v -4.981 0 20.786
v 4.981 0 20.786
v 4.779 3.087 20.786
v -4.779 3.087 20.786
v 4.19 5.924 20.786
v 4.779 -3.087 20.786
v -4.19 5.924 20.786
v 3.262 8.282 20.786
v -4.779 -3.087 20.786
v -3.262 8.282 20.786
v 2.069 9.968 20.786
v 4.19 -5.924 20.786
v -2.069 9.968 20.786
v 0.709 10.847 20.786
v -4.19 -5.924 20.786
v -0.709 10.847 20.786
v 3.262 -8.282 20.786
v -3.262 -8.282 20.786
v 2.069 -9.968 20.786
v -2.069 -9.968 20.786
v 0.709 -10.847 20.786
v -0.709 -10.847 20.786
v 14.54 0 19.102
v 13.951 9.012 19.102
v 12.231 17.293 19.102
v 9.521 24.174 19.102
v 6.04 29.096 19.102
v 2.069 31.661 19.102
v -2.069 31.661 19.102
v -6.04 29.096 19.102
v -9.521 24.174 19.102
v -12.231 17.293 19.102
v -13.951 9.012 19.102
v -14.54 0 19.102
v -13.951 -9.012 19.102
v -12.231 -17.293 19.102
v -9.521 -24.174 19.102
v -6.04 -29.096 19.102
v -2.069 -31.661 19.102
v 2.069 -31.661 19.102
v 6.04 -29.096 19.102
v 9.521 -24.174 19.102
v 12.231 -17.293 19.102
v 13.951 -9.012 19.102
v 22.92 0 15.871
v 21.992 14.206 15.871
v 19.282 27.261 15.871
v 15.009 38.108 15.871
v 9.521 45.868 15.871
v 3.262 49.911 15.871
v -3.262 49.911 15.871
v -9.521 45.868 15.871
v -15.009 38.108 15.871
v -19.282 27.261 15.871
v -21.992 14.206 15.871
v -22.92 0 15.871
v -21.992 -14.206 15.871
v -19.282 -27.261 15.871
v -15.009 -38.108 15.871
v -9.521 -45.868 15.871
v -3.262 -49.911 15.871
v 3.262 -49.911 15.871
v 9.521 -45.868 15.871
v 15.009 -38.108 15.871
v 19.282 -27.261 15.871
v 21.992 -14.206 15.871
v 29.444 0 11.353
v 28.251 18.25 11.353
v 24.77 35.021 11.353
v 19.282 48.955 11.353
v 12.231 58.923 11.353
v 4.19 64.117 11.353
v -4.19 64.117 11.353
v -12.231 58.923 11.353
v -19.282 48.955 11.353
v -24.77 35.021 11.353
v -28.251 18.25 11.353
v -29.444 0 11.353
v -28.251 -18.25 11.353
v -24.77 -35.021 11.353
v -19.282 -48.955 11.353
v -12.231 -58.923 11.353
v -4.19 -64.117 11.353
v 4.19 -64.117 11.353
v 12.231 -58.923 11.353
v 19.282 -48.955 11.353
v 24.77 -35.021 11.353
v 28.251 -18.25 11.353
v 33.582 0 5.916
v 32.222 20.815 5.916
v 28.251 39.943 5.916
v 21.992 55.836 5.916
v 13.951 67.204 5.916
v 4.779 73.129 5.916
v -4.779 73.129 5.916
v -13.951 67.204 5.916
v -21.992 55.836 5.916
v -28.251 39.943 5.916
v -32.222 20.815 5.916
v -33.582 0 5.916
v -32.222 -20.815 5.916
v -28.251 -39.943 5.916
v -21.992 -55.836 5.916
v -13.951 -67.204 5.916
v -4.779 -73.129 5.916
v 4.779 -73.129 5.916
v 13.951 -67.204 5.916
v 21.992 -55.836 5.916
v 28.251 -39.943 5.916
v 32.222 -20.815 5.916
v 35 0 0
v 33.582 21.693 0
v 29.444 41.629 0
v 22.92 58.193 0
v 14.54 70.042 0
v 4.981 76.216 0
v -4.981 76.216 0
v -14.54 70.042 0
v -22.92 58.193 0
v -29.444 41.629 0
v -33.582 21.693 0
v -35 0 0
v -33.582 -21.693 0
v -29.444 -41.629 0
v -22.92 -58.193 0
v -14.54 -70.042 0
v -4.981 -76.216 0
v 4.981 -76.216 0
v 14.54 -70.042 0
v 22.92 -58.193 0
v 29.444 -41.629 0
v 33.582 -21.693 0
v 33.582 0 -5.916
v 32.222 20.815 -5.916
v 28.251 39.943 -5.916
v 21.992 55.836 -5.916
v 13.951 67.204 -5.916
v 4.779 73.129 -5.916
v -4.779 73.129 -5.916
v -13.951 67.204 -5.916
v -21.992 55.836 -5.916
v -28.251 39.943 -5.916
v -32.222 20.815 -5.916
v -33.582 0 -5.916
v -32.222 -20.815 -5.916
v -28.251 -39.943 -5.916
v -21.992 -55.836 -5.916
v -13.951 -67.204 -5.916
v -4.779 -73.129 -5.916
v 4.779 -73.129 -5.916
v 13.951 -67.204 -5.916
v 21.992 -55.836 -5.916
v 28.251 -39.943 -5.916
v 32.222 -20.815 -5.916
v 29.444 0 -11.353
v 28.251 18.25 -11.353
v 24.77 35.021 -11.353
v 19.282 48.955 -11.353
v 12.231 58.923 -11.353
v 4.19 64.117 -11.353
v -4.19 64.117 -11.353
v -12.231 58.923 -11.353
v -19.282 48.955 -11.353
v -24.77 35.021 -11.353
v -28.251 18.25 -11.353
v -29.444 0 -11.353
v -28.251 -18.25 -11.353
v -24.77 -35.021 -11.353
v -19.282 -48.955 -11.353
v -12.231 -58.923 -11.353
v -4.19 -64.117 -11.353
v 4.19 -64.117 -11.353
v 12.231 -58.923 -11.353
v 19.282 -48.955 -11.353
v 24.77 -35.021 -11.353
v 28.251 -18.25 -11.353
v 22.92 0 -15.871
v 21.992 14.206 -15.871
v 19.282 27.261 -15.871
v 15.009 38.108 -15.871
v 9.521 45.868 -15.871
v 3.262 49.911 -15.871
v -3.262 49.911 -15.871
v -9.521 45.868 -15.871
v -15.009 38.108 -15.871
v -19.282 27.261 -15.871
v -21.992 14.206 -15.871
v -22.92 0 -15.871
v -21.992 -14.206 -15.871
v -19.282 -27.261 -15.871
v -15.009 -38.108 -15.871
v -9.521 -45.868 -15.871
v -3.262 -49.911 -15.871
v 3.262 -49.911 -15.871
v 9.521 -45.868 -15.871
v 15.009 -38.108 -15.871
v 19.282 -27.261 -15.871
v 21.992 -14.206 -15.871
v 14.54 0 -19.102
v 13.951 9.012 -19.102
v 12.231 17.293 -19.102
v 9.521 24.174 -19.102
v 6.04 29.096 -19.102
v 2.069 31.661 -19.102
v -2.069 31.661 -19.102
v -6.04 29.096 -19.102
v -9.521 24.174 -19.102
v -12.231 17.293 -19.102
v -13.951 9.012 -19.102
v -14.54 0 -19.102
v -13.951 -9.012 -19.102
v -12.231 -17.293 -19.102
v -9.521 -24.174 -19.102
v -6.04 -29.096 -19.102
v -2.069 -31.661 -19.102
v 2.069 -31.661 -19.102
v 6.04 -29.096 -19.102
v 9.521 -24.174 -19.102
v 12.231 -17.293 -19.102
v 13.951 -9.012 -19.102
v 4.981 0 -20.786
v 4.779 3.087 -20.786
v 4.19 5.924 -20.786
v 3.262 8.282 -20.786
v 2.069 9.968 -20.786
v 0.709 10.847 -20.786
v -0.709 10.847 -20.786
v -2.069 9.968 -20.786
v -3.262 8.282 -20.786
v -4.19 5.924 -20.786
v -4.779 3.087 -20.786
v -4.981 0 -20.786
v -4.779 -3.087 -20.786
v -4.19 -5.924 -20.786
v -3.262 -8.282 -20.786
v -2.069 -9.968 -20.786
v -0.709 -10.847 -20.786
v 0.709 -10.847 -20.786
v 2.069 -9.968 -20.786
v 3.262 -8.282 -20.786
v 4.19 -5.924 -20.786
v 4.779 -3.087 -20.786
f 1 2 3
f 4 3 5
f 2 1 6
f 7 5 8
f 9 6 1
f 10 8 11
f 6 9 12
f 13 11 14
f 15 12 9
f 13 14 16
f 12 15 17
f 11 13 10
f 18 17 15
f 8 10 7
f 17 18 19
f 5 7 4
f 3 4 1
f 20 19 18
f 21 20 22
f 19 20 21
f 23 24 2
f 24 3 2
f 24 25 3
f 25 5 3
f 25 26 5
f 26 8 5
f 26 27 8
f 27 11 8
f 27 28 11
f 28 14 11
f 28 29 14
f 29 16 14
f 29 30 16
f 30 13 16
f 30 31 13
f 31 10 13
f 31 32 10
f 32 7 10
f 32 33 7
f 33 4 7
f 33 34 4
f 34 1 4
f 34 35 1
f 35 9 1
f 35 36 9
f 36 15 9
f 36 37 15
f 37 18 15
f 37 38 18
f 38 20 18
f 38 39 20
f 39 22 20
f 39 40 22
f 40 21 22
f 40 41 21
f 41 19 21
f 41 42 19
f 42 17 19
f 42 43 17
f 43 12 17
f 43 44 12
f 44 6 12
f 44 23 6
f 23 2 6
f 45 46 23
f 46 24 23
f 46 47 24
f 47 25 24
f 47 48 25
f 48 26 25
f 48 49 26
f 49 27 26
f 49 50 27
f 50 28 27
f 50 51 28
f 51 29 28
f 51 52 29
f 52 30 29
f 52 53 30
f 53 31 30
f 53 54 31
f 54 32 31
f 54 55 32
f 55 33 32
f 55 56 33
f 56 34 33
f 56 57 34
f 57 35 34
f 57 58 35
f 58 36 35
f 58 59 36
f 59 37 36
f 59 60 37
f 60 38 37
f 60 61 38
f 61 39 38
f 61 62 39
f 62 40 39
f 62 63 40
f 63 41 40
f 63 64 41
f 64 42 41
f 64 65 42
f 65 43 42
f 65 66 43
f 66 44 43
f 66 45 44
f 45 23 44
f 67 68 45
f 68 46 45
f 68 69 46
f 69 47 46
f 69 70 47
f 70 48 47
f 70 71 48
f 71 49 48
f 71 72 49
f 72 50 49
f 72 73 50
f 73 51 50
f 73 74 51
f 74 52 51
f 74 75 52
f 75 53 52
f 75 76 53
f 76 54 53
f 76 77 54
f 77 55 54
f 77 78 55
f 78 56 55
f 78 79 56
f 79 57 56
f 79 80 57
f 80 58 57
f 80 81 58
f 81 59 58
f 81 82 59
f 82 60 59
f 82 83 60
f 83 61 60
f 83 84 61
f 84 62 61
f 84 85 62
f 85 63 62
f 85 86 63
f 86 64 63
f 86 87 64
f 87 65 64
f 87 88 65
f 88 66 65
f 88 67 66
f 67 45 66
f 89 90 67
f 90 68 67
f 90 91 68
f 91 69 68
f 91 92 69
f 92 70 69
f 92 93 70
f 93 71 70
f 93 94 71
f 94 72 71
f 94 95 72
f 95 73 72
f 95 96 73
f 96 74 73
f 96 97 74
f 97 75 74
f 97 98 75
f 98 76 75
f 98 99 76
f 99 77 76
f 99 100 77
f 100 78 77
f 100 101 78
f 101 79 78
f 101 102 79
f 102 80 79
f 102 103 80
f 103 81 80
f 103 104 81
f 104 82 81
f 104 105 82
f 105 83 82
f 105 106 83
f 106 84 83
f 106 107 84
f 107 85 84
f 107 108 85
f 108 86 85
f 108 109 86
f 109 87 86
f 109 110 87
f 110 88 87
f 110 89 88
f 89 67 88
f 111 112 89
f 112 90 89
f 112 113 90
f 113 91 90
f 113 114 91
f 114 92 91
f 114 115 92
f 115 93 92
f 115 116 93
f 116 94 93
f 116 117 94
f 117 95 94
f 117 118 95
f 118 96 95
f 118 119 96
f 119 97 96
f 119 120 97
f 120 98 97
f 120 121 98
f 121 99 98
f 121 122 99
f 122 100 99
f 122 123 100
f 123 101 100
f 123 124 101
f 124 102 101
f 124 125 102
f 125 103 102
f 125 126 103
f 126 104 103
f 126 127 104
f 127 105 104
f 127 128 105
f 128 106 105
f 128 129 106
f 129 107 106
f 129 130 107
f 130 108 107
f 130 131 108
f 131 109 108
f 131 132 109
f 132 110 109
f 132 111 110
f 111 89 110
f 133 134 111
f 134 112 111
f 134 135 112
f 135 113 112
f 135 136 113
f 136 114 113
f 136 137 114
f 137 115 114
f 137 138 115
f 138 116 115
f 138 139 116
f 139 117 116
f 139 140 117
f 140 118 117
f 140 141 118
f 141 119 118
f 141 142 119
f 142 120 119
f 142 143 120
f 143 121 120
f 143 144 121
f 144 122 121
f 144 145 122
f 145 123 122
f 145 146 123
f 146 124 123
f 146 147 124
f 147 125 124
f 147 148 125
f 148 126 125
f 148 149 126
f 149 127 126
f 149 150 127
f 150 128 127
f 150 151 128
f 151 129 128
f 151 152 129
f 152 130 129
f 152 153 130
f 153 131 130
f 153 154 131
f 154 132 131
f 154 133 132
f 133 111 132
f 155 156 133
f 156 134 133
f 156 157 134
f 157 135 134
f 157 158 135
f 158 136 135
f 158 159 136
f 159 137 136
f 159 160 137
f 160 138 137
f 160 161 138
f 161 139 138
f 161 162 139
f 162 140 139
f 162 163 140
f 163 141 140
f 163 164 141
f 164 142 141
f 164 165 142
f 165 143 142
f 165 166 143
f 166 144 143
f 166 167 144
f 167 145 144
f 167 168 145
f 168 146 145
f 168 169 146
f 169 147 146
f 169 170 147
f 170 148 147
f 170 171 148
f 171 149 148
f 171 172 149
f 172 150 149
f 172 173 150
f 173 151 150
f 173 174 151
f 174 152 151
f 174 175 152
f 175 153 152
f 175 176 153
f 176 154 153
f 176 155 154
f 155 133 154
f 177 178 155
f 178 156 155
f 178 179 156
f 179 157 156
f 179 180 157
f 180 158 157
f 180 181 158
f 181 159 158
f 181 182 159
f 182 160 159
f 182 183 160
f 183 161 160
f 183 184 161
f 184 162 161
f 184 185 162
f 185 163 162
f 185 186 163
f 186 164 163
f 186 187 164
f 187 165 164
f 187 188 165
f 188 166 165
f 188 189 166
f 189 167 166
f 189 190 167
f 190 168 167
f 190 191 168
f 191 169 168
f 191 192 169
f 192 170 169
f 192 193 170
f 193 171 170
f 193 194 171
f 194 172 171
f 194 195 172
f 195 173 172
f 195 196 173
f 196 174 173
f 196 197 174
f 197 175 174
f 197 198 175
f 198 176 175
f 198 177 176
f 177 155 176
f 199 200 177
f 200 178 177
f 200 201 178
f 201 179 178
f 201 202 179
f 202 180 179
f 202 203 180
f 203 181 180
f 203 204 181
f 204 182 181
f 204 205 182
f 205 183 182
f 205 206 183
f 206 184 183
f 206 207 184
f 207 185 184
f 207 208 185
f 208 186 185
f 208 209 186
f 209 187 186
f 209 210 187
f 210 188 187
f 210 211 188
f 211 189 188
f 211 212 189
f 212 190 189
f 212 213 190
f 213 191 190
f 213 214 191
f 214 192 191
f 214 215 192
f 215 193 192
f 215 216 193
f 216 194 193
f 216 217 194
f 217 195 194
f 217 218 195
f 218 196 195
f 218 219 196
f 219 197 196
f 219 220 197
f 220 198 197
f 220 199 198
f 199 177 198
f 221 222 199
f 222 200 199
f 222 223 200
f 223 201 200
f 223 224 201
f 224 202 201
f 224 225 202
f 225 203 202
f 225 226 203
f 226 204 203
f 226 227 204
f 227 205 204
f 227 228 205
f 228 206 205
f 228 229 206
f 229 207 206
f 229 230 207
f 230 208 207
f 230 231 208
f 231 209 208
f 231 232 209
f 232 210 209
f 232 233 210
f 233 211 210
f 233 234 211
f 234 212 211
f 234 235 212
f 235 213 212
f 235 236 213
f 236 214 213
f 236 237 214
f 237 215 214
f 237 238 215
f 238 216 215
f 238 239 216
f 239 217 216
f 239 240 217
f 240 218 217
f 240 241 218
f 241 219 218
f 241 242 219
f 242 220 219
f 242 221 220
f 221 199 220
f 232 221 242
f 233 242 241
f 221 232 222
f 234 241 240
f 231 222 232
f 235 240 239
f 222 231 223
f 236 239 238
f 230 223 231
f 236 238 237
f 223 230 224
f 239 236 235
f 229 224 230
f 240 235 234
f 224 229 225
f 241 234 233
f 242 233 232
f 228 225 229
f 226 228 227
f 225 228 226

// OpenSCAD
// Generated by SolidPython 1.0.1 on 2020-07-29 00:46:46


scale(v = [5, 11, 3]) {
	sphere(r = 7);
}
/***********************************************
*********      SolidPython code:      **********
************************************************
 
# import packages: SolidPython
from solid import *
from solid.utils import *
from itertools import chain, combinations, permutations


class Resize:

    def __init__(self, scad_file):
        self.scad_file = scad_file
        #self.scad_file = import_scad(scad_file)
        # cone/cylinder param:
        self.r1 = 0
        self.r2 = 0
        self.h = 0
        # rectangular prism param:
        self.w = 0
        self.l = 0
        # ellipse param:
        self.r = 0

    # import OpenScad code (file name corresponds to shape)


    # classify shape + parameters
    def assign(self, param1, param2, param3):
        if self.scad_file == 'cone.scad':
            self.r1 = param1
            self.r2 = param2
            self.h = param3
        elif self.scad_file == 'cylinder.scad':
            self.r1 = param1
            self.r2 = param2
            self.h = param3
        elif self.scad_file == 'rectangularPrism.scad':
            self.h = param1
            self.l = param2
            self.w = param3
        else:
            self.r = param1
            self.h = param2

    # resize parameters
    def iterate(self):
        x = range(3, 20, 2)
        i = 1
        if self.scad_file == 'cone.scad':
            tempList = list(permutations(x, 2))
            for temp in tempList:
                param1 = temp[0]
                param2 = temp[1]
                filepath = 'produced_scad_files/' + 'cone' + str(param1) + '_' + str(param2) + '_' + '.scad'
                scad_render_to_file(cylinder(h=param1, r1=param2, r2=0), filepath)

        elif self.scad_file == 'cylinder.scad':
            tempList = list(permutations(x, 3))
            for temp in tempList:
                param1 = temp[0]
                param2 = temp[1]
                filepath = 'produced_scad_files/' + 'cylinder' + str(param1) + '_' + str(param2) + '_' + '.scad'
                scad_render_to_file(cylinder(h=param1, r1=param2, r2=param2), filepath)

        elif self.scad_file == 'rectangularPrism.scad':
            tempList = list(permutations(x, 3))
            for temp in tempList:
                param1 = temp[0]
                param2 = temp[1]
                param3 = temp[2]
                filepath = 'produced_scad_files/' + 'rectangularPrism' + str(param1) + '_' + str(param2) + '_' + str(
                    param3) + '.scad'
                scad_render_to_file(cube(size=(param1, param2, param3)), filepath)

        elif self.scad_file == 'ellipse.scad':
            tempList = list(permutations(x, 4))
            for temp in tempList:
                param1 = temp[0]
                param2 = temp[1]
                param3 = temp[2]
                param4 = temp[3]
                filepath = 'produced_scad_files/' + 'ellipse' + str(param1) + '_' + str(param2) + '_' + str(param3) + '_' + str(param4) + '.scad'
                scad_render_to_file(scale([param1, param2, param3])(sphere(r=param4)), filepath)

    def render_to_scadfile(self):
        scad_render_to_file(scad, 'example.scad') 
 
************************************************/
